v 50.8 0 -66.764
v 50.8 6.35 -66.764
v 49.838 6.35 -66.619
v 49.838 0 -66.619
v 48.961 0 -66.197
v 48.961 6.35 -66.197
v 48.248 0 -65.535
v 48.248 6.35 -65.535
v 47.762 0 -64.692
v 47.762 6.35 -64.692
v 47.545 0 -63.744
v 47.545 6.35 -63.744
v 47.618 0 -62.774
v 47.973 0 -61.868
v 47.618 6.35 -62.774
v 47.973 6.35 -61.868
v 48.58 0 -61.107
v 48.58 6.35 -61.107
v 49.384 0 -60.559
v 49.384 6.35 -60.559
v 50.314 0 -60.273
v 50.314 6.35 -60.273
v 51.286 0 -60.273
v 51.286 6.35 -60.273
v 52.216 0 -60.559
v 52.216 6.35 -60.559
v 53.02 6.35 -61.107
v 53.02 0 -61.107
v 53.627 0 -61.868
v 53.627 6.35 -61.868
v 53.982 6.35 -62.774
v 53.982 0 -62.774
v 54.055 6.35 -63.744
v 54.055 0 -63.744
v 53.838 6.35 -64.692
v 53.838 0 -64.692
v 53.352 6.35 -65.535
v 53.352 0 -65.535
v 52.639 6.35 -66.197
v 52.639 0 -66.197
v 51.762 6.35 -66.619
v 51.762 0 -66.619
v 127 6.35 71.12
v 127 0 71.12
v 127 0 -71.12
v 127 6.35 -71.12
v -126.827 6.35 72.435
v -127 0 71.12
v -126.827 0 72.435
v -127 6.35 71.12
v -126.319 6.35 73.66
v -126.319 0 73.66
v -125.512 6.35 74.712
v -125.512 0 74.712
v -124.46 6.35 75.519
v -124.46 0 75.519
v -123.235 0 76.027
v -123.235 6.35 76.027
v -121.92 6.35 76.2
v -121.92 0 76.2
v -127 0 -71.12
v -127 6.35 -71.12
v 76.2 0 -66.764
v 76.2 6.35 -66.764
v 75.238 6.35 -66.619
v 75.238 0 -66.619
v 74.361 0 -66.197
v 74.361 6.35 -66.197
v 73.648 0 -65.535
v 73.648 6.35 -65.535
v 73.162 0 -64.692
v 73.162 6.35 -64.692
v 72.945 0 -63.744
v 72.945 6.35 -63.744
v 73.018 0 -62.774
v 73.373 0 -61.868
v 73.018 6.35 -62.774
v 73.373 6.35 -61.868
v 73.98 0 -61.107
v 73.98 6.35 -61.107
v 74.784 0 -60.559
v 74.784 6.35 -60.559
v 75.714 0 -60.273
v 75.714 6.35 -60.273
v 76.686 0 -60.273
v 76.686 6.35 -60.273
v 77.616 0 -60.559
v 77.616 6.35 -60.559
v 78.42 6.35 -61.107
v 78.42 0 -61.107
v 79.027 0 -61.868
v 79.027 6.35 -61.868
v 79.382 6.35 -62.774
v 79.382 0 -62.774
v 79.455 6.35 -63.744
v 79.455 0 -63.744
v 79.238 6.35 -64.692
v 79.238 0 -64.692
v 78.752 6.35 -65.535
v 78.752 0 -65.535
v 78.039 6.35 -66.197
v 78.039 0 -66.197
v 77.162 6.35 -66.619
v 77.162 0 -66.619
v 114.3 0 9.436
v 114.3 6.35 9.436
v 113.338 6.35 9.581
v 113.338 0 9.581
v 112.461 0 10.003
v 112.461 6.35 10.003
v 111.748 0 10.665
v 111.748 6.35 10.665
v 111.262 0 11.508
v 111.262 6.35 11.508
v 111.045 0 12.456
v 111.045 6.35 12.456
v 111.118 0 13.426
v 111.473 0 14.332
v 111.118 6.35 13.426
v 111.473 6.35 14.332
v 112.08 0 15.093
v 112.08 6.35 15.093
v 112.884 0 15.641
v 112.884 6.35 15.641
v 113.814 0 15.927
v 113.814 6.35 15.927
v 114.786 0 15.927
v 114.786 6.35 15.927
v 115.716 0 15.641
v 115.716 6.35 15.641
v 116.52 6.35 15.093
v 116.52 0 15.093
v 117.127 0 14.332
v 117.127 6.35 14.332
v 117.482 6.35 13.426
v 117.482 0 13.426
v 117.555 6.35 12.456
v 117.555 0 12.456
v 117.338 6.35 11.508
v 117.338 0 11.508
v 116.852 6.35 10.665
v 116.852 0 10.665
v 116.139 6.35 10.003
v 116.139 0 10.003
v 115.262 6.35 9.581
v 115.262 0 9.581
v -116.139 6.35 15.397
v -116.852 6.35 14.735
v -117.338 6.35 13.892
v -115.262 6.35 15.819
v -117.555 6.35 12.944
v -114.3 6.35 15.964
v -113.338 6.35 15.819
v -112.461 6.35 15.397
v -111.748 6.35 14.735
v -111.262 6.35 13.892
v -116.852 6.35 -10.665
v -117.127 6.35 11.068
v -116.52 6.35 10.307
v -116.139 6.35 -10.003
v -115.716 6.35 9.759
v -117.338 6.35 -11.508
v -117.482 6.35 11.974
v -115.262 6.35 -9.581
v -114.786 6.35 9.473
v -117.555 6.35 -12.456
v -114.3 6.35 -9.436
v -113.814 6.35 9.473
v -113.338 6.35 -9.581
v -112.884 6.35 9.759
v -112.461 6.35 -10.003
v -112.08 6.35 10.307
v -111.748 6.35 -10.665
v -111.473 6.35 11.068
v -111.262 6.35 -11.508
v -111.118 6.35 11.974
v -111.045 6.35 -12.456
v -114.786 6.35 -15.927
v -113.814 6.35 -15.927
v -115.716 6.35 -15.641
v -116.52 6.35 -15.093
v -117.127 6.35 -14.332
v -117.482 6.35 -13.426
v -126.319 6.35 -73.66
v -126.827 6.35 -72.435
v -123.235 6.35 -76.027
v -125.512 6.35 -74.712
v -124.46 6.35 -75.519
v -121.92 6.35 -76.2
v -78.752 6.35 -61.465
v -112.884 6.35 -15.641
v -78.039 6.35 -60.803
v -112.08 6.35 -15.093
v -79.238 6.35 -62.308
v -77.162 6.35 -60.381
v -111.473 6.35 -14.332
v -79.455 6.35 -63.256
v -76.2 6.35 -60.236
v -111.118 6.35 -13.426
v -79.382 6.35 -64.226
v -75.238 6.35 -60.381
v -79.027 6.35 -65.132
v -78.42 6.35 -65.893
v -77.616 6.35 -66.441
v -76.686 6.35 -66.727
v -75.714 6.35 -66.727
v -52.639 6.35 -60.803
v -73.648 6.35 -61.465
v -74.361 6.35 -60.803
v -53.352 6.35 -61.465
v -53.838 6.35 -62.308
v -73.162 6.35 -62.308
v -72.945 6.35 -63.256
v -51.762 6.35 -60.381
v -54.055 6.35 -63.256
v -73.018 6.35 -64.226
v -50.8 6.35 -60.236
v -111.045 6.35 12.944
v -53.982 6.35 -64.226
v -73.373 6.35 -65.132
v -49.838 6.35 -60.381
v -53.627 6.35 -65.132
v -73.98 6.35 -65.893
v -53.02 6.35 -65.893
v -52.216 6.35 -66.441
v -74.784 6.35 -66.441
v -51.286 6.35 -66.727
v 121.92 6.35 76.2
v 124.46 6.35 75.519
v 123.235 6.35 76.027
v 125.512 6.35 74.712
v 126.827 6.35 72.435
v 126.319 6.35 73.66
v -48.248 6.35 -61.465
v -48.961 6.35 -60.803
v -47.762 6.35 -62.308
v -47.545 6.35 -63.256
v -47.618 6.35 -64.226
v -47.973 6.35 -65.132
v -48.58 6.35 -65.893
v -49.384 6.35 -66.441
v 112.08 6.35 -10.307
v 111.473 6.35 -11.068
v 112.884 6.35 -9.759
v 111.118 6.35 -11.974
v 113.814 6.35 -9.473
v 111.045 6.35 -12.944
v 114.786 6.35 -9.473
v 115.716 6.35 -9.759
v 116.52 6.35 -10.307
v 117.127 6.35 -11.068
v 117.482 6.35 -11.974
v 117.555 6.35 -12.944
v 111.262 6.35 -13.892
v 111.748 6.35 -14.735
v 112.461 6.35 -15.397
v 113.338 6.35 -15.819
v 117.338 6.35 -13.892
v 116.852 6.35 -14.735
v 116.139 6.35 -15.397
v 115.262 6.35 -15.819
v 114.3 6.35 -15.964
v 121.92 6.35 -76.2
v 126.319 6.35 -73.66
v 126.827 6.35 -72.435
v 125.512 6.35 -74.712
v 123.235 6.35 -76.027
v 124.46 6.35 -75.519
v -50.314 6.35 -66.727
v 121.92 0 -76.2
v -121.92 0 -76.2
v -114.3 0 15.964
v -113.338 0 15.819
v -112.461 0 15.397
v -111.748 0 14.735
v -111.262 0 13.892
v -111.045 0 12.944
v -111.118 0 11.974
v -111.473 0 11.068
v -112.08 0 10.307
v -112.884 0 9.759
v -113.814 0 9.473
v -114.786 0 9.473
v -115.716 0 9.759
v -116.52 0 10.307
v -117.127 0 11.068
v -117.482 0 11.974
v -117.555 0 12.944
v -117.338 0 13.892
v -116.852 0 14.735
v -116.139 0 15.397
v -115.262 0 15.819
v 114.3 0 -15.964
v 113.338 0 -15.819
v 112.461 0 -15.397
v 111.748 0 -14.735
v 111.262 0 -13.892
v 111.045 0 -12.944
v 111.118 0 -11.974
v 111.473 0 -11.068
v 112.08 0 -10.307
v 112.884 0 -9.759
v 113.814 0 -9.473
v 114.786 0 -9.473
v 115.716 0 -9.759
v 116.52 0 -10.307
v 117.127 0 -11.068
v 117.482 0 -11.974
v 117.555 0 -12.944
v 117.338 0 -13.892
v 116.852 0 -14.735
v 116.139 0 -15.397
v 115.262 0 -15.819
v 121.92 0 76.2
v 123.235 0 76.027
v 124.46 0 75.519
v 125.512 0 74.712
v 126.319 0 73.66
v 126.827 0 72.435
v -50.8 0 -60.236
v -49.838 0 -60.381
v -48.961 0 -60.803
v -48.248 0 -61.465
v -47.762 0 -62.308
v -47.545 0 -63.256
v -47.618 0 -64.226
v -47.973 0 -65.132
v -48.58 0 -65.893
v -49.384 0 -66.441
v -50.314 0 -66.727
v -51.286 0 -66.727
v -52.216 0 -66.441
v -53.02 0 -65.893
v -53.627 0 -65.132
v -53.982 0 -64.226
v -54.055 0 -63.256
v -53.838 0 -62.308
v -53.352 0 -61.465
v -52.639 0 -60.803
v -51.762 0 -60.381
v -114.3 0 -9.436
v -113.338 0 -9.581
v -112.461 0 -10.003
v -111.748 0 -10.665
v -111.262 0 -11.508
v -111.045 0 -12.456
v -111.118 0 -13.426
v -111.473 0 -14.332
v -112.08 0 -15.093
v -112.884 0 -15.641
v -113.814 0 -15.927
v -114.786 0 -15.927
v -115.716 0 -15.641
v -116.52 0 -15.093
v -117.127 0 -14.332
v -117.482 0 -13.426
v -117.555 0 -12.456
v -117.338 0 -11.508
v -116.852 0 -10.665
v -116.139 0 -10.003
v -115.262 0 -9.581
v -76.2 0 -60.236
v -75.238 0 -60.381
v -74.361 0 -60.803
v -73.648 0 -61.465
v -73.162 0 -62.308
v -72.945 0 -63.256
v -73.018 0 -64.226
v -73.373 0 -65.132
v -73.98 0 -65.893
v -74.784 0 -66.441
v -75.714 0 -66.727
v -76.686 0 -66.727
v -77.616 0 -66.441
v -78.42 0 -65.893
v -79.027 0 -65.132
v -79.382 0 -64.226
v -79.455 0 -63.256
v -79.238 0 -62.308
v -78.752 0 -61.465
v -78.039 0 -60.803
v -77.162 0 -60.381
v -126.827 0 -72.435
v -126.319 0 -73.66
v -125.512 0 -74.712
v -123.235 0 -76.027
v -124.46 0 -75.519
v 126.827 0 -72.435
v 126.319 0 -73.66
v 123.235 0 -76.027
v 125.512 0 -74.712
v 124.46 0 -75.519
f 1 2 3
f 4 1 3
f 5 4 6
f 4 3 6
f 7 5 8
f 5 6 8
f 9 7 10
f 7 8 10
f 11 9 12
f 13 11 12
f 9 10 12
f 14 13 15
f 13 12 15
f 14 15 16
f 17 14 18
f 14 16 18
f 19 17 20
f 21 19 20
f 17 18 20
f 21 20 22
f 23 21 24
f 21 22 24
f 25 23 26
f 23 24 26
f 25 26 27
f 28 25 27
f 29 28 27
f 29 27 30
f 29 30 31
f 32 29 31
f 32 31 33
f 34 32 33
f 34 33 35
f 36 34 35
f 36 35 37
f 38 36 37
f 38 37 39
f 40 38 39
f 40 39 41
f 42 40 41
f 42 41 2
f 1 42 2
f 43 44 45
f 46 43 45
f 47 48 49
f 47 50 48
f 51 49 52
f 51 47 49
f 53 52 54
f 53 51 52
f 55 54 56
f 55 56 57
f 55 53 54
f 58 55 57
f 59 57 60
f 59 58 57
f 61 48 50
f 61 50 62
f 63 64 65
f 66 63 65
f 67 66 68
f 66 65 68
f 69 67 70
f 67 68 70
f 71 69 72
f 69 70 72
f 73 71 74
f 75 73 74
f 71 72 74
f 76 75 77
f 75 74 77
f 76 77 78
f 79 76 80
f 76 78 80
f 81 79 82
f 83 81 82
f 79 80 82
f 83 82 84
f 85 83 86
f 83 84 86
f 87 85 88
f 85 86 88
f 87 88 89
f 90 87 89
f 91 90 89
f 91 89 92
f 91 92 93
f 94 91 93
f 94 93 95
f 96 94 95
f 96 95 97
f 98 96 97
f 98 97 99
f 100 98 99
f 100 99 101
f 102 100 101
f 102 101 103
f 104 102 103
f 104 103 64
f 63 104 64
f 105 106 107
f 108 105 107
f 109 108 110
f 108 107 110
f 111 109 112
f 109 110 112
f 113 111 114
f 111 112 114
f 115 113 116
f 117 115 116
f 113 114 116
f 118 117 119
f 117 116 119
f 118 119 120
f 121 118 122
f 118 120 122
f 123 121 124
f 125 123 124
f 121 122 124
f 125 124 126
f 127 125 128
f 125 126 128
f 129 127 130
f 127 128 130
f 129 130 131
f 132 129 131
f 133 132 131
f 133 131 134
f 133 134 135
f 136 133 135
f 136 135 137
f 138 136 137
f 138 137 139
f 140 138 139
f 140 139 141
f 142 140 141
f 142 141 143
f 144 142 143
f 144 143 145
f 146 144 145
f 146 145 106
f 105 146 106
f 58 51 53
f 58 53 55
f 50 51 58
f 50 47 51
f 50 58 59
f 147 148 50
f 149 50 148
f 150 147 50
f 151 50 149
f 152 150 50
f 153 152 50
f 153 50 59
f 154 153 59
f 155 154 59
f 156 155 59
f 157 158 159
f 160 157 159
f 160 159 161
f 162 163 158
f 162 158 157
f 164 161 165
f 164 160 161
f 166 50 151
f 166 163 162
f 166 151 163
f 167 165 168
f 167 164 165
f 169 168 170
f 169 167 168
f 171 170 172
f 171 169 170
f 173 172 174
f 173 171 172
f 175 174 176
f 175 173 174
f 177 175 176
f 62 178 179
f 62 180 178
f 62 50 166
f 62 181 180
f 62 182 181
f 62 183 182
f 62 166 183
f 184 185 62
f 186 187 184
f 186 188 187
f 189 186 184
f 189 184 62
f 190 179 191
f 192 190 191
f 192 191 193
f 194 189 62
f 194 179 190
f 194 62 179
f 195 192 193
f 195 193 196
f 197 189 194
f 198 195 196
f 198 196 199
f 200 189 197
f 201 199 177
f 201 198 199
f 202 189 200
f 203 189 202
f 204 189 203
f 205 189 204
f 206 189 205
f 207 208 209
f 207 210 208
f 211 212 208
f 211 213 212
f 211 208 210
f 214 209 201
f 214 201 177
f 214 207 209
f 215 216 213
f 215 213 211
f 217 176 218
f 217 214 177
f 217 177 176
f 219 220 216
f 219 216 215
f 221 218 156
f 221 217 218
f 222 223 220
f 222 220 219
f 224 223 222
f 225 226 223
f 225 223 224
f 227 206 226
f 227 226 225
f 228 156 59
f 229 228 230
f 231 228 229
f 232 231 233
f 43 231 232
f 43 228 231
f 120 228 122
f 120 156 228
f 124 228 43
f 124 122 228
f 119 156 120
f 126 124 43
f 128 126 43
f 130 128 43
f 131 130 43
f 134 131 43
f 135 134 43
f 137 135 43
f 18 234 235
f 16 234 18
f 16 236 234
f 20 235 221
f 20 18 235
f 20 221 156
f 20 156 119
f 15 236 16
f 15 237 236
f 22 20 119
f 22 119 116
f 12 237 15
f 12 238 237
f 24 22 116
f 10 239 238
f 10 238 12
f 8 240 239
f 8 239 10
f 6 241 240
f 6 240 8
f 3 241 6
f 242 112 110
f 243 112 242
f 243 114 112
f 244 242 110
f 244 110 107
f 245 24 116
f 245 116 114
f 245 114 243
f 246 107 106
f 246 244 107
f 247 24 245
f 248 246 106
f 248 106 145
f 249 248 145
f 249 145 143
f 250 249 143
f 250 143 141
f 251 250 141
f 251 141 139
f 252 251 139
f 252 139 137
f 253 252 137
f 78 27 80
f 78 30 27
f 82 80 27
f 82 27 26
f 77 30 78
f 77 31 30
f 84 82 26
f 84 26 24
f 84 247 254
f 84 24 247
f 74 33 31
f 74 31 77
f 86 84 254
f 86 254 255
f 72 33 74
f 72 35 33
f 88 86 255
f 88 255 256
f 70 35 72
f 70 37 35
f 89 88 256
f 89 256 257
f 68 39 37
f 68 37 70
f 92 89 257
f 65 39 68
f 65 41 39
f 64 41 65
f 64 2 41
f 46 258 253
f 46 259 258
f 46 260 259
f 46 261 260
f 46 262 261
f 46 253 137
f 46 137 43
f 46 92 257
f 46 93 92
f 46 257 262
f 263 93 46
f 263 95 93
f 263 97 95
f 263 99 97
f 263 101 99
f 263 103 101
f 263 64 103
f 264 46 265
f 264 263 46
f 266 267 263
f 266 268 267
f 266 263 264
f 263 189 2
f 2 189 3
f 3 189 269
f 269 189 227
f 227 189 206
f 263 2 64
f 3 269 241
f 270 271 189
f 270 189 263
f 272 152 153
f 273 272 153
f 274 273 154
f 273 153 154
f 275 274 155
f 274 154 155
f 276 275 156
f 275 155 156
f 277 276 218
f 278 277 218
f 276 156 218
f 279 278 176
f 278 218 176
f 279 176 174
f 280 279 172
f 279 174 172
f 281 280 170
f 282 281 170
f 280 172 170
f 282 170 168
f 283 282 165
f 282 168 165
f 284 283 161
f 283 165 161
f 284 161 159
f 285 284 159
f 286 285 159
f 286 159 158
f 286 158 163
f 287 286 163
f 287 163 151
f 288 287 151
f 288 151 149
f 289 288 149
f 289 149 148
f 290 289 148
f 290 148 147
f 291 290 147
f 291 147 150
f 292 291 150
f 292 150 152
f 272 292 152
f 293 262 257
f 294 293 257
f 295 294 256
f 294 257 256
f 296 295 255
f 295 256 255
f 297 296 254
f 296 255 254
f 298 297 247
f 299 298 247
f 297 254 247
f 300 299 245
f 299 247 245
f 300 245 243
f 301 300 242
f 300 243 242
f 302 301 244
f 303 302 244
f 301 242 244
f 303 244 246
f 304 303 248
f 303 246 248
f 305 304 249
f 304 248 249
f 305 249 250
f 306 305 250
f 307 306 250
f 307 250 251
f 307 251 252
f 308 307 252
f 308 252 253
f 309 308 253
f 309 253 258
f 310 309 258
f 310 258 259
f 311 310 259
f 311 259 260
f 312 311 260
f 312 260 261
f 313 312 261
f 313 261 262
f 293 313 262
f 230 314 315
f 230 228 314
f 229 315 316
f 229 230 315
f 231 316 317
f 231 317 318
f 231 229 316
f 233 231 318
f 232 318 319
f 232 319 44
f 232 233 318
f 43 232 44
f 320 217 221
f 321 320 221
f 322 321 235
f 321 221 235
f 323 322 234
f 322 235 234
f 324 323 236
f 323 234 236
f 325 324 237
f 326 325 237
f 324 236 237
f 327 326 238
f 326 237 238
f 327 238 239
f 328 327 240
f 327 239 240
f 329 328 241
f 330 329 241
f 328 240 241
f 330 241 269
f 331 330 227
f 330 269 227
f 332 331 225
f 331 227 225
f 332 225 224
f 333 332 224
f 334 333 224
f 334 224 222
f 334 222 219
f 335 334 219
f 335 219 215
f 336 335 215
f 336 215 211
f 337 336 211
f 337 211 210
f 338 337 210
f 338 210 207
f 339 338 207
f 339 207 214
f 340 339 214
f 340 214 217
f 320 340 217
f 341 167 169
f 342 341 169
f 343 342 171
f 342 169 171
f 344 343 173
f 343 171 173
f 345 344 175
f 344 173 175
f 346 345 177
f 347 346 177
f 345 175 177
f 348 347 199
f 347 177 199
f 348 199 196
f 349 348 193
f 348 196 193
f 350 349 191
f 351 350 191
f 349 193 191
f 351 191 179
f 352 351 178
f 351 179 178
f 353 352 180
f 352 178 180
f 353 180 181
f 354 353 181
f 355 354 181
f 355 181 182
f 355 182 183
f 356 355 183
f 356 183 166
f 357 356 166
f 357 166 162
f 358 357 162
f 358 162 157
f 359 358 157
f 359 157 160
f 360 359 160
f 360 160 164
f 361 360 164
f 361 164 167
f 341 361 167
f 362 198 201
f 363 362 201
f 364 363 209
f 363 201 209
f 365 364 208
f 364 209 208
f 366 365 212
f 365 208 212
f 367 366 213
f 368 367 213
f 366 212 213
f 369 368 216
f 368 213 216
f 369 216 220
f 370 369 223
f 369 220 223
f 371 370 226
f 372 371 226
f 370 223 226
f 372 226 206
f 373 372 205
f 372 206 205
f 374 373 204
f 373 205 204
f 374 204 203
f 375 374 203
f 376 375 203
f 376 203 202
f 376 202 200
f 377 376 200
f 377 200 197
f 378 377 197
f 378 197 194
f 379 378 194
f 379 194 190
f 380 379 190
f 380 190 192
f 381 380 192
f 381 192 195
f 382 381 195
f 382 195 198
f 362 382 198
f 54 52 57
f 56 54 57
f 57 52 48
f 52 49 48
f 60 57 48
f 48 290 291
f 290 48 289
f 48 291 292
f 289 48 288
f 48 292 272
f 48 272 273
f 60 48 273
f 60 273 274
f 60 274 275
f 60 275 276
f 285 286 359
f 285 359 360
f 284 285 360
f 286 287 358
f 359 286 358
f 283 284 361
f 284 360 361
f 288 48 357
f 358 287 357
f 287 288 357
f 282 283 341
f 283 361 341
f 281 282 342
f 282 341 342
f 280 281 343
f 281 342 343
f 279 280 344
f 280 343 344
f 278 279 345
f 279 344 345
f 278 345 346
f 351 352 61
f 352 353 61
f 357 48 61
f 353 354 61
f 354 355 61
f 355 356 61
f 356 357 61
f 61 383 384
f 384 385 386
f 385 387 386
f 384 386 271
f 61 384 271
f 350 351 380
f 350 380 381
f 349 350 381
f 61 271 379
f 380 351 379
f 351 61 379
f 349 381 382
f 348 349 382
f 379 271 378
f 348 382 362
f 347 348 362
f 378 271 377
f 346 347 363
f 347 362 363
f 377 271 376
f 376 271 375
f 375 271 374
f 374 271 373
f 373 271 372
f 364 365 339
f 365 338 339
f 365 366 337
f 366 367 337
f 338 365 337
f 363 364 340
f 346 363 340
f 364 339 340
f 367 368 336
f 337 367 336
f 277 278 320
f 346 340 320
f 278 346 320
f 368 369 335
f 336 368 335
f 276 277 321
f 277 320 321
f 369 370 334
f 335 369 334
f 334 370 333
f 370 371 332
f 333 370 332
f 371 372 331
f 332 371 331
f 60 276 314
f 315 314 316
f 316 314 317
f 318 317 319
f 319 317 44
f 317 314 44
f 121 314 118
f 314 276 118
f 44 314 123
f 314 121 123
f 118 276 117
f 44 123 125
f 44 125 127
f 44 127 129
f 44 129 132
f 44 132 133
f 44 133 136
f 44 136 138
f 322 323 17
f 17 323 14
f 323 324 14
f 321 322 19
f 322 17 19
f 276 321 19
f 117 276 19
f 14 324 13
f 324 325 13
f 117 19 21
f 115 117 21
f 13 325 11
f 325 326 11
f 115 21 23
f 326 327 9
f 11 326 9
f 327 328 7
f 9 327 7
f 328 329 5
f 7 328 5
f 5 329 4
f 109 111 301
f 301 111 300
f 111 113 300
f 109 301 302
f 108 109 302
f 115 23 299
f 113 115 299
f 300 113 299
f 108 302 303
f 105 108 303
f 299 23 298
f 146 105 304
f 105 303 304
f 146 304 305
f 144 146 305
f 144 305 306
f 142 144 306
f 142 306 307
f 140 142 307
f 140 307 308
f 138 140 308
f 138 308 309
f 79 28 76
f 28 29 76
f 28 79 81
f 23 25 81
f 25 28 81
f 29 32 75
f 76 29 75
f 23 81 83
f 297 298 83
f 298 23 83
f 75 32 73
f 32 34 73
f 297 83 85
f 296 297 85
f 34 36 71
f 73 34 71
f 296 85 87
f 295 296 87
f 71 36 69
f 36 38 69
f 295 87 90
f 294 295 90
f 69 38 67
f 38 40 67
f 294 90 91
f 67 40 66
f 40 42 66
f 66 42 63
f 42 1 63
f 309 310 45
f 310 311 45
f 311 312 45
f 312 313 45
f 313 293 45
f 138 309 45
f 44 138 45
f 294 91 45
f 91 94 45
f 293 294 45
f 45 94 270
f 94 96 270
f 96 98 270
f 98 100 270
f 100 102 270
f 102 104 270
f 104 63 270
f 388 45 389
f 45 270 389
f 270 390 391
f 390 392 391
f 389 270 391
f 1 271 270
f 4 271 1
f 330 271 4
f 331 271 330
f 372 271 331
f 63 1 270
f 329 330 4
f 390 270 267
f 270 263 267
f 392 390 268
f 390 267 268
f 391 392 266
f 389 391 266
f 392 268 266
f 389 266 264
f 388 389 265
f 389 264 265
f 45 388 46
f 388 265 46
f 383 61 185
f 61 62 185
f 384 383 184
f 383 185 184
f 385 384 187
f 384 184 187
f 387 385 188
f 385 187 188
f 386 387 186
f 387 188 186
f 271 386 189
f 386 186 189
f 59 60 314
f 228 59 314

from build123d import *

# Parameters (mm, degrees)
SKETCH1_W           = 254
SKETCH1_H           = 152.4
BOSS_EXTRUDE1_DEPTH = 6.35
SKETCH3_R           = 3.2639
CUT_EXTRUDE2_DEPTH  = 149.24224263
FILLET1_R           = 5.08


with BuildPart() as part:
    # Sketch1 → Boss-Extrude1 (new body)
    with BuildSketch(Plane(origin=(0, 0, 0), x_dir=(1, 0, 0), z_dir=(0, 1, 0))):
        Rectangle(SKETCH1_W, SKETCH1_H)
    extrude(amount=BOSS_EXTRUDE1_DEPTH)

    # Sketch3 → Cut-Extrude2 (cut, through all)
    with BuildSketch(Plane(origin=(0, 6.35, 0), x_dir=(1, 0, 0), z_dir=(0, 1, 0))):
        with Locations(Location((-114.3, 12.7, 0), (0, 0, 270))):
            Circle(SKETCH3_R)
        with Locations(Location((-114.3, -12.7, 0), (0, 0, 270))):
            Circle(SKETCH3_R)
        with Locations(Location((-76.2, 63.5, 0), (0, 0, 270))):
            Circle(SKETCH3_R)
        with Locations(Location((-50.8, 63.5, 0), (0, 0, 270))):
            Circle(SKETCH3_R)
        with Locations(Location((50.8, 63.5, 0), (0, 0, 90))):
            Circle(SKETCH3_R)
        with Locations(Location((76.2, 63.5, 0), (0, 0, 90))):
            Circle(SKETCH3_R)
        with Locations(Location((114.3, -12.7, 0), (0, 0, 90))):
            Circle(SKETCH3_R)
        with Locations(Location((114.3, 12.7, 0), (0, 0, 90))):
            Circle(SKETCH3_R)
    extrude(amount=-CUT_EXTRUDE2_DEPTH, mode=Mode.SUBTRACT)

    # Fillet1
    fillet1_edges = [part.edges().sort_by_distance(p)[0] for p in [
        (127, 3.175, 76.2),
        (-127, 3.175, 76.2),
        (-127, 3.175, -76.2),
        (127, 3.175, -76.2),
    ]]
    fillet(fillet1_edges, radius=FILLET1_R)


solid = part.part
